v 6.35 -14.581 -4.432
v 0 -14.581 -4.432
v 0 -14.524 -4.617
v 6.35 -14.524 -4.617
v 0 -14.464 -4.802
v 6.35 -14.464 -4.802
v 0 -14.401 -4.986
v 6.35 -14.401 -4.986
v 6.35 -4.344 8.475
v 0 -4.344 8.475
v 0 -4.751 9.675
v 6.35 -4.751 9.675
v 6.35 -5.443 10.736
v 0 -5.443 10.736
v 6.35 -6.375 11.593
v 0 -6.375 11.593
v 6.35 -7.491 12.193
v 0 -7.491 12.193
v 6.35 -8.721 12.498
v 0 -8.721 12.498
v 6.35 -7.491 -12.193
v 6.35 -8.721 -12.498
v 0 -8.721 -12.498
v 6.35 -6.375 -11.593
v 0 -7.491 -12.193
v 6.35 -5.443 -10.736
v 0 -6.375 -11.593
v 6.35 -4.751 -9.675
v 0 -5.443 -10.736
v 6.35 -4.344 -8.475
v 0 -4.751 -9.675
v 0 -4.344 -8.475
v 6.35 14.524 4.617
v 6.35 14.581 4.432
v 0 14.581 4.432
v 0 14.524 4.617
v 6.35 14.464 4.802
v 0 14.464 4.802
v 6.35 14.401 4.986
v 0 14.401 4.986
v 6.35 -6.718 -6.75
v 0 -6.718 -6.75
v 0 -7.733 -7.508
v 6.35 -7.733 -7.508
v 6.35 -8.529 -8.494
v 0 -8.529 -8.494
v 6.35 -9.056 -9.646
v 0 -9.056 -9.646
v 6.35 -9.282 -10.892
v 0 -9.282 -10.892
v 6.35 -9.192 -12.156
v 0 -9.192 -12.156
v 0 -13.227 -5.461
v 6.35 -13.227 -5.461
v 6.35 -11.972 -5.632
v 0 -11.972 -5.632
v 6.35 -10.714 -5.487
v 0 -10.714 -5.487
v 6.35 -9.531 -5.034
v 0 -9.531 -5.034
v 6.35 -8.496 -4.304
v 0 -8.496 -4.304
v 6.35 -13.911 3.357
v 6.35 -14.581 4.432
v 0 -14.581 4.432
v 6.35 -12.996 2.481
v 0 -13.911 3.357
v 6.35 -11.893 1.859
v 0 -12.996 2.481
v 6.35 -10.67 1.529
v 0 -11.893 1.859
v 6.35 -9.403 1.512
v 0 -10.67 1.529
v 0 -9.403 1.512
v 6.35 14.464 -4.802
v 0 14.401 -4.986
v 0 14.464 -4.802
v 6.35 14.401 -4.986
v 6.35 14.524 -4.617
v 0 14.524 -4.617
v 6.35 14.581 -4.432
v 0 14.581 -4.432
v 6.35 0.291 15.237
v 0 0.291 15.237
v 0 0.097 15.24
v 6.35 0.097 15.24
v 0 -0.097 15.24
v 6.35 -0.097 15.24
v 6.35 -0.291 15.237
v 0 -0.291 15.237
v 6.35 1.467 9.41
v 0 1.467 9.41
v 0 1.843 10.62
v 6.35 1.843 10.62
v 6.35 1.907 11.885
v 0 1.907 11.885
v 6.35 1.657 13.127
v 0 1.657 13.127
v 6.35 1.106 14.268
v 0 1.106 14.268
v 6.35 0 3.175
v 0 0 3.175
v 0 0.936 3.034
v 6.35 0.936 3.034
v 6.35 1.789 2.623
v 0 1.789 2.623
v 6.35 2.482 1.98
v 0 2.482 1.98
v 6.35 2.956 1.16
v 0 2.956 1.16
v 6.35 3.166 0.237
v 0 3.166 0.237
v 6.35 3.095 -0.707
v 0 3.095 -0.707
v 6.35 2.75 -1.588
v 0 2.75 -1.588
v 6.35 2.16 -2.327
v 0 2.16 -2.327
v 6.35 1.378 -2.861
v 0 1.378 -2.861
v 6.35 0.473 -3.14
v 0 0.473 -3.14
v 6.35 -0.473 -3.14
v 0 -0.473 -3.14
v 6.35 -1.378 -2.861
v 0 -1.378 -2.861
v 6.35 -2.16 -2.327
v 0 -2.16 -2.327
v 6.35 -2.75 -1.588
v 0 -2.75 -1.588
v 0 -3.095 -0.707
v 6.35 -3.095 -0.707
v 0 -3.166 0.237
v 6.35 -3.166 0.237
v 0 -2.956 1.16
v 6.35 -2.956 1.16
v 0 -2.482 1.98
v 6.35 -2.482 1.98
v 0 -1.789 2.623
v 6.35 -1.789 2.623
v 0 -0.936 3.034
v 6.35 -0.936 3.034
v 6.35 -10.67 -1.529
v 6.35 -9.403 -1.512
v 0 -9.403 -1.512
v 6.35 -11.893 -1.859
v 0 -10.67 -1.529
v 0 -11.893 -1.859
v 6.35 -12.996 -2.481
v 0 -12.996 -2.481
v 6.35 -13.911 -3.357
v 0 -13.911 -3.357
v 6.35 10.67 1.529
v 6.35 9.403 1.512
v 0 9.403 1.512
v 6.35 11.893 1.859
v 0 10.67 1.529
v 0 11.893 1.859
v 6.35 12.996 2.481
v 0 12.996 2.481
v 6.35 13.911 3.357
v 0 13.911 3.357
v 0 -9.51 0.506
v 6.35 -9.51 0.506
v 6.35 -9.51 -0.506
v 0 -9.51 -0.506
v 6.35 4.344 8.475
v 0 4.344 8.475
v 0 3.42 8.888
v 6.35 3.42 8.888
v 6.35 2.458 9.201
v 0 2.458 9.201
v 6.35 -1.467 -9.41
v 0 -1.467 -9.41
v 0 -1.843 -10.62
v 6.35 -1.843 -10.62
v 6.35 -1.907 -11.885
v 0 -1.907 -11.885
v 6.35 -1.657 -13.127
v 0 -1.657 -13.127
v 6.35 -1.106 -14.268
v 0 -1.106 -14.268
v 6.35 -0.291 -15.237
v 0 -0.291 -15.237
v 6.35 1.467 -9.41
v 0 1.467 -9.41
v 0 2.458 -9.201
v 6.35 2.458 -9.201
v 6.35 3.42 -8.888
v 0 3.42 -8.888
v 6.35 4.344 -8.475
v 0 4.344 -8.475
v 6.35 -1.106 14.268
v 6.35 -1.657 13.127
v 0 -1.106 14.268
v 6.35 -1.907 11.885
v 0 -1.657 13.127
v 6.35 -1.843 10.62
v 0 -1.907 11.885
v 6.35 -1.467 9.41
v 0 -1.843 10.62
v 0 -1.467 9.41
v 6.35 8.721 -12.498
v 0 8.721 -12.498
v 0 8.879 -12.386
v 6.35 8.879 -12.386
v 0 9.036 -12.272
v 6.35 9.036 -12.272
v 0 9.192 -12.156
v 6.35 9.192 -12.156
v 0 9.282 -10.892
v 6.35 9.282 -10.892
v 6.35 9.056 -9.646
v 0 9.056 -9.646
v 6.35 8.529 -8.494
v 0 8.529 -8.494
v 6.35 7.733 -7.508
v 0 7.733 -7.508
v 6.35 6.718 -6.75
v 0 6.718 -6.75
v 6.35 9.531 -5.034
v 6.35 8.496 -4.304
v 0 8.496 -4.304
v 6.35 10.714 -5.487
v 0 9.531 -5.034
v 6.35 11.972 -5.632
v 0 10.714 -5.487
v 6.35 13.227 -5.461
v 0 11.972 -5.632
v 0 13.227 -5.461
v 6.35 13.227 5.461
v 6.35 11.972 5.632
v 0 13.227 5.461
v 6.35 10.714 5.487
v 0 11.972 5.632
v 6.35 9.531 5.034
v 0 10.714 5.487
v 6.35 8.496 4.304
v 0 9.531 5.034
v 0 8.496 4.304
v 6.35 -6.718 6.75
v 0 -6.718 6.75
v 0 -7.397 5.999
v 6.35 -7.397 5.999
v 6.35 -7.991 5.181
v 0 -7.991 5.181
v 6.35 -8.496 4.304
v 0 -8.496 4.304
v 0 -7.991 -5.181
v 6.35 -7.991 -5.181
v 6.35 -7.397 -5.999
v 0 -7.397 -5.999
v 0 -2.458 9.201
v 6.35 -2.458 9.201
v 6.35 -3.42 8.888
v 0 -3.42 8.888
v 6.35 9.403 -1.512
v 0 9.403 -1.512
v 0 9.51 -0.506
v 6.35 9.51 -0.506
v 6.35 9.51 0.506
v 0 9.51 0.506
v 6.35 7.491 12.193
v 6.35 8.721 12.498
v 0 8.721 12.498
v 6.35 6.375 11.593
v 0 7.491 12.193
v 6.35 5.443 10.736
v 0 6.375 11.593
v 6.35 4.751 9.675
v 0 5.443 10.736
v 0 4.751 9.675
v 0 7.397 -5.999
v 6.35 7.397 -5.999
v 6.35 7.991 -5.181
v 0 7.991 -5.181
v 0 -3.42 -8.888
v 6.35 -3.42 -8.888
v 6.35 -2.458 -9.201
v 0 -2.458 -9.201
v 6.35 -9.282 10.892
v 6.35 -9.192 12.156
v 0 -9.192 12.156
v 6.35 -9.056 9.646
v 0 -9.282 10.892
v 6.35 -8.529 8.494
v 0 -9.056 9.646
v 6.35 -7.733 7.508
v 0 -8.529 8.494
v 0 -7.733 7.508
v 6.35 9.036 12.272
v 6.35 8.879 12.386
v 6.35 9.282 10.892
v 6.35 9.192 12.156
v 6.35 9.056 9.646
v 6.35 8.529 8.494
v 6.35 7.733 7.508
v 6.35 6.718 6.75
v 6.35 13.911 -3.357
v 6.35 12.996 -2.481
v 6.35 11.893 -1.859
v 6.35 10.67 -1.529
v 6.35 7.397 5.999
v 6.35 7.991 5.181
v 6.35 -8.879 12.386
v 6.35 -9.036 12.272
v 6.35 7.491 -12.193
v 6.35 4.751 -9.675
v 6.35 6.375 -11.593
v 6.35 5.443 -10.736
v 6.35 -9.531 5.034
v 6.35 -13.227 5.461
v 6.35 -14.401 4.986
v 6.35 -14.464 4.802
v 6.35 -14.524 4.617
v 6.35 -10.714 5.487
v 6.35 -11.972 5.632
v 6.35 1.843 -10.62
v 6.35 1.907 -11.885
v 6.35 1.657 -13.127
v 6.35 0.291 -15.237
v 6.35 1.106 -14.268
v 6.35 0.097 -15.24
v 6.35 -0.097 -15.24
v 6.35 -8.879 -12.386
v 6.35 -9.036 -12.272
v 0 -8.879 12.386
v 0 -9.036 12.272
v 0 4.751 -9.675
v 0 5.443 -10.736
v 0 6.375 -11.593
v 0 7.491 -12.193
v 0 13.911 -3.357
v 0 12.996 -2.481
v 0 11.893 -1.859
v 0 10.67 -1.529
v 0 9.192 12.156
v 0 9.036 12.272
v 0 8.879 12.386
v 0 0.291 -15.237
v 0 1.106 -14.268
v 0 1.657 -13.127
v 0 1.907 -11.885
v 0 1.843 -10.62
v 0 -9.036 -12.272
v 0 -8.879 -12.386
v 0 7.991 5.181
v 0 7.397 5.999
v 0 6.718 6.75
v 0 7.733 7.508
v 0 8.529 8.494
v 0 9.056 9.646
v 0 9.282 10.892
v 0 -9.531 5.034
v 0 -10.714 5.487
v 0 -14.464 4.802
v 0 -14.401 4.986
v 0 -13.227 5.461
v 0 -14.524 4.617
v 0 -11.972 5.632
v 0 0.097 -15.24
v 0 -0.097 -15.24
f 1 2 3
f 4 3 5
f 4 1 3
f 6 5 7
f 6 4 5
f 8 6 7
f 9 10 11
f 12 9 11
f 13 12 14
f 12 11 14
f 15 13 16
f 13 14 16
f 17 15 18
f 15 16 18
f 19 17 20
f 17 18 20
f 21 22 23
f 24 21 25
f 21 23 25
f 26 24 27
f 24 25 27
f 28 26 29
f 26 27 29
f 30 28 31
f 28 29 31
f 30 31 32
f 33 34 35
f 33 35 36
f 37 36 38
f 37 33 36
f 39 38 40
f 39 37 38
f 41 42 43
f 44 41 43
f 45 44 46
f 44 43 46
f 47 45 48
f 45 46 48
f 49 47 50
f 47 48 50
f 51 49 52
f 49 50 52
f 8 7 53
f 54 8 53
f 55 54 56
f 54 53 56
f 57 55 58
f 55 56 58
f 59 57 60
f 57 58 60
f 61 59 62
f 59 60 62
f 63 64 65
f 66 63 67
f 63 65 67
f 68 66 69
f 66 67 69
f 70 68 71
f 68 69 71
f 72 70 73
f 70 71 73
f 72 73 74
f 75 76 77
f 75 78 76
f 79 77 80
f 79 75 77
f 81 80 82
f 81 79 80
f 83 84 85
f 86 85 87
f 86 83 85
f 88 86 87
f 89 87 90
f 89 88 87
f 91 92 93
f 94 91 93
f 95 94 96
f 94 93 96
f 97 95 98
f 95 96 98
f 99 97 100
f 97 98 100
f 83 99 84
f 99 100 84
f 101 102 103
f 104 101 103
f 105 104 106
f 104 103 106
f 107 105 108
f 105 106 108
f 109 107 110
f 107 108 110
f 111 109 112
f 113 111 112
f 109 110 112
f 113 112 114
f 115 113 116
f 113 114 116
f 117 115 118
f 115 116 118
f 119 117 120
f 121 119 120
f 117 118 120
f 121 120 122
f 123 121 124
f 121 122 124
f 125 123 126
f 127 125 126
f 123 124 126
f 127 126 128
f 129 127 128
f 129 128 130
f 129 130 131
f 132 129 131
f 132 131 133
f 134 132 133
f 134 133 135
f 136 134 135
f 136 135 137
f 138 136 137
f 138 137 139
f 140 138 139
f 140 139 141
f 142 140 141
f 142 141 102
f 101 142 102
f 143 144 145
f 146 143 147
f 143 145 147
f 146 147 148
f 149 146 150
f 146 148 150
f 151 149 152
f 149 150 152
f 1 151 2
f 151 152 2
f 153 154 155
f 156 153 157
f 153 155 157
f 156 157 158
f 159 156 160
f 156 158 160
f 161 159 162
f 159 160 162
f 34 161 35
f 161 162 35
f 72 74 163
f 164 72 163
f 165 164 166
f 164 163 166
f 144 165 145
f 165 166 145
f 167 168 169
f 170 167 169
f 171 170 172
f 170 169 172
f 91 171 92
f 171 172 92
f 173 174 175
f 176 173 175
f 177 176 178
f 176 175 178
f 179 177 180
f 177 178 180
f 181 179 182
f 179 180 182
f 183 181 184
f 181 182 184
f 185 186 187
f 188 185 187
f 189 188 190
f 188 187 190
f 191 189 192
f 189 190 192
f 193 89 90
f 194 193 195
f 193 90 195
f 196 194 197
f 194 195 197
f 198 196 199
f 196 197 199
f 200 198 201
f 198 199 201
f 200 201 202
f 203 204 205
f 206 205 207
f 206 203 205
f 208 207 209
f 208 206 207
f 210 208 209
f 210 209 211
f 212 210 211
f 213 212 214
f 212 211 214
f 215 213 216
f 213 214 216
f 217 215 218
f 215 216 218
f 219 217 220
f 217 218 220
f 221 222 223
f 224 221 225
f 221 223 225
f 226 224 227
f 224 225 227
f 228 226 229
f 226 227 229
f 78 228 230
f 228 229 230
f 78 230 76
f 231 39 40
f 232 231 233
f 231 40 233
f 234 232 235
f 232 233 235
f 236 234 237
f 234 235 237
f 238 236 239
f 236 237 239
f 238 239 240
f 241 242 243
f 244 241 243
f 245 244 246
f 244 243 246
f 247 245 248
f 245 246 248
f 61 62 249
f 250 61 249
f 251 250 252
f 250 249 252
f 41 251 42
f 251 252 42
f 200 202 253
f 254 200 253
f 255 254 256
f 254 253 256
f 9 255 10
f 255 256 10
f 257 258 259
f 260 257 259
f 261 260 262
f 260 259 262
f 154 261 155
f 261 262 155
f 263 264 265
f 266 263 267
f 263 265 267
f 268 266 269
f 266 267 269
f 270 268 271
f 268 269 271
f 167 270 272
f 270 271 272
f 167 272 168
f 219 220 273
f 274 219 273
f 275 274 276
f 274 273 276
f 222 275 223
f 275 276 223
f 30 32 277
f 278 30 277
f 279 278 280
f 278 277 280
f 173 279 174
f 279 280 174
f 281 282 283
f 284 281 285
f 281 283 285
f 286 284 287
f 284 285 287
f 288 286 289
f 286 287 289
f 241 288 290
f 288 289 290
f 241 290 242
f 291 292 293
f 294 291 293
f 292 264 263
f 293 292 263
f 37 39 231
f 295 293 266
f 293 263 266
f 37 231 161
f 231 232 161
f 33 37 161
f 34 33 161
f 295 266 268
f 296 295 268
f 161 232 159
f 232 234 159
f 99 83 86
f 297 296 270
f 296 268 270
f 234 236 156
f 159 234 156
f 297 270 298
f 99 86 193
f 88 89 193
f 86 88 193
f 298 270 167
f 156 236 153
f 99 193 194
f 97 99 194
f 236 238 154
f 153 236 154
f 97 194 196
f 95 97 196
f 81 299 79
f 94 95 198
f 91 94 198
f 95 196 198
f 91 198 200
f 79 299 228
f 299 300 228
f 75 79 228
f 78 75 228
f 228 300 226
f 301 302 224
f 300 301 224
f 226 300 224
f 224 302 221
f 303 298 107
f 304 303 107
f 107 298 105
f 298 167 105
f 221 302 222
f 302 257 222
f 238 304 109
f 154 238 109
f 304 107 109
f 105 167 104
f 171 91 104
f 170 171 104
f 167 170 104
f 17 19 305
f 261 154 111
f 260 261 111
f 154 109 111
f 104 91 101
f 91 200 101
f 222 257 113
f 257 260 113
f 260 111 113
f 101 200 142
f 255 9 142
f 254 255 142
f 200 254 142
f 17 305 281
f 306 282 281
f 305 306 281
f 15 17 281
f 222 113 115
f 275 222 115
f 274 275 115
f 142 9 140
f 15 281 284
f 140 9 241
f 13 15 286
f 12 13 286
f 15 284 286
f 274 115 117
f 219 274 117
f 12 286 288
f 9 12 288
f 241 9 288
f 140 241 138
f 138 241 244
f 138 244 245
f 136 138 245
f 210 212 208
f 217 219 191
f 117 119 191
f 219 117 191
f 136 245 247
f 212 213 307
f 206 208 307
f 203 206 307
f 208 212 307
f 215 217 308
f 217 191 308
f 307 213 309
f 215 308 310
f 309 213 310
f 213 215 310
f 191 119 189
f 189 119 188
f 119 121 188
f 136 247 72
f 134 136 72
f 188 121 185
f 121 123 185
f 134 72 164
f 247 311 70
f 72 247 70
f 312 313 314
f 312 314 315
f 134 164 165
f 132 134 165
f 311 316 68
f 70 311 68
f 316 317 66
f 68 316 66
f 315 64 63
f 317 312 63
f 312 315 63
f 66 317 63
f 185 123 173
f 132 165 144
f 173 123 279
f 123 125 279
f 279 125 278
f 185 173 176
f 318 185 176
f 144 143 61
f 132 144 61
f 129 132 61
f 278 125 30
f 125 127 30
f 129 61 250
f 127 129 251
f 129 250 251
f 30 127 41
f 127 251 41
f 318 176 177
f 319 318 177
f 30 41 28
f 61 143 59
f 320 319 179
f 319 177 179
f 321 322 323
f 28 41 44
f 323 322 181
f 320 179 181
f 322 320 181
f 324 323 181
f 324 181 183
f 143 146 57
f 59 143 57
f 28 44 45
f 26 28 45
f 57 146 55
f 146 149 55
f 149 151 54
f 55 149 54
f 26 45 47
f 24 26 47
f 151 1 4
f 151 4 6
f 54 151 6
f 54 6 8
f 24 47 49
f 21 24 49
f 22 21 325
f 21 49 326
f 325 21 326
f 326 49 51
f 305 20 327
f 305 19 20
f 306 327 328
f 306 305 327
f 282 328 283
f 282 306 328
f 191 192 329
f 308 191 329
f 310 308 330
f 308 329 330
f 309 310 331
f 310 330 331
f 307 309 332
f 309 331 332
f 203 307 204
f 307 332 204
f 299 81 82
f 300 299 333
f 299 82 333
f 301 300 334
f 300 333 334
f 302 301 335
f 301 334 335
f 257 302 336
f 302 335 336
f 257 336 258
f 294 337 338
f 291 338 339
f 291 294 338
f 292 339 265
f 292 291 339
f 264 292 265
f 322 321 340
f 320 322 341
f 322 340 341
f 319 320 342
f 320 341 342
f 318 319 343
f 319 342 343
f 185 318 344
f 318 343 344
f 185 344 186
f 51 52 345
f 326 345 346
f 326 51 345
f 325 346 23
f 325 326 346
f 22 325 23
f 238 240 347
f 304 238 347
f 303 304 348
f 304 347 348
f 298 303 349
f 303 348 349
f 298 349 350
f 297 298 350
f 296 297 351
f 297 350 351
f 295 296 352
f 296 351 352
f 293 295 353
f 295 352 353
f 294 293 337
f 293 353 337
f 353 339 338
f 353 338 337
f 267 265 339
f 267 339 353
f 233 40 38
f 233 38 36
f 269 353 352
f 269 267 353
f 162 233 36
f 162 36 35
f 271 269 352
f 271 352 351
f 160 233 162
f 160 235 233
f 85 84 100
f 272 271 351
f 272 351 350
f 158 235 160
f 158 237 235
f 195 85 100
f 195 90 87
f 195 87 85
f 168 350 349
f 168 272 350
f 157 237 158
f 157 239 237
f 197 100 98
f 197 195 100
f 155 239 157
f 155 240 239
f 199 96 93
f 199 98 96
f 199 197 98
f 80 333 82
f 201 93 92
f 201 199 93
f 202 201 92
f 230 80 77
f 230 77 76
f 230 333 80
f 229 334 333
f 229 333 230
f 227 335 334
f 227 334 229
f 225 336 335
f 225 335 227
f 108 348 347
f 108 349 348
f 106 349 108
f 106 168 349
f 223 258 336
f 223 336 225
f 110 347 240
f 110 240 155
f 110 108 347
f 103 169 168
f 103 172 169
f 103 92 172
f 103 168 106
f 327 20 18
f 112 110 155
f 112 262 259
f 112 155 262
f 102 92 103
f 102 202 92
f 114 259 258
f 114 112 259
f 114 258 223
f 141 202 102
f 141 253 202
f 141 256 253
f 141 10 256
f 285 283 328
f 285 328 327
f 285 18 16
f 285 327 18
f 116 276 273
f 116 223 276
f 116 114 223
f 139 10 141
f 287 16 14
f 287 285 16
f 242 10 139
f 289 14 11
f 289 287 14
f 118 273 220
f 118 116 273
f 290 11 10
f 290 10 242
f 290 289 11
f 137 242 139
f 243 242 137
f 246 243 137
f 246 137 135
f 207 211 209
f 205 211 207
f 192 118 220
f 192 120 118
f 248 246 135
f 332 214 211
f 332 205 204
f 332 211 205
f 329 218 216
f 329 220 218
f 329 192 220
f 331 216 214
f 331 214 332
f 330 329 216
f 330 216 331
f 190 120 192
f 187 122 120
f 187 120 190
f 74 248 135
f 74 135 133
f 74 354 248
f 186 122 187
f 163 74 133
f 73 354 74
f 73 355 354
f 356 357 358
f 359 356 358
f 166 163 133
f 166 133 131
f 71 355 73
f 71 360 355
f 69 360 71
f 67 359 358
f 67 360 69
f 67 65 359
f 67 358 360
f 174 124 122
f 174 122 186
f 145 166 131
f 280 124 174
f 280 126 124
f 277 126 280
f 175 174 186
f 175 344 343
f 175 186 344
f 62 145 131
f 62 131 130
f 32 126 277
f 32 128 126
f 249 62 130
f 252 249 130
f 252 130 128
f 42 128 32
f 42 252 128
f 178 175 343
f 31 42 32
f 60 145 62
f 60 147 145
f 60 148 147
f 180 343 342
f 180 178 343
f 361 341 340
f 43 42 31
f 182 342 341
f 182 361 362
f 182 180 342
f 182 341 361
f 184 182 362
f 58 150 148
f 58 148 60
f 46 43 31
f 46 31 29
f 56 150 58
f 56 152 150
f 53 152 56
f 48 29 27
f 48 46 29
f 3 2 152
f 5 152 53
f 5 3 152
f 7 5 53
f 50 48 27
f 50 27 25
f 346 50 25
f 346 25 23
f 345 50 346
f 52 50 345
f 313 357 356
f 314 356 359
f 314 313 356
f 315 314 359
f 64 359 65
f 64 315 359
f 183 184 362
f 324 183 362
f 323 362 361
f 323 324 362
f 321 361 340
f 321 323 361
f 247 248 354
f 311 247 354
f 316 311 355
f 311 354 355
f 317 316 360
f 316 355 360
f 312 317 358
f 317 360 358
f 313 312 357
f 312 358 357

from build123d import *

# Parameters (mm, degrees)
BASPROSKE_W        = 6.35
BASPROSKE_H        = 15.24
TOOTHCUT_DEPTH     = 23.468593636
TEETHCUTS_COUNT    = 10
TEETHCUTS_ANGLE    = 324
BORSKE_R           = 0.396875
BORE_DEPTH         = 50.8000508
KEYSKE_W           = 0.254
KEYSKE_H           = 0.619125
KEYWAY_DEPTH       = 50.8000508
SKETCH1_R          = 3.175
CUT_EXTRUDE1_DEPTH = 23.027224313


with BuildPart() as part:
    # BasProSke → Base-Revolve (revolve)
    with BuildSketch(Plane(origin=(0, 0, 0), x_dir=(1, 0, 0), z_dir=(0, 1, 0)), mode=Mode.PRIVATE) as base_revolve_sk:
        with Locations((3.175, 7.62)):
            Rectangle(BASPROSKE_W, BASPROSKE_H)
    revolve(base_revolve_sk.sketch.rotate(Axis((-10, 0, 0), (1, 0, 0)), 180), axis=Axis((-10, 0, 0), (1, 0, 0)))

    # TooCutSke → ToothCut (cut, through all)
    with BuildSketch(Plane(origin=(0, 0, 0), x_dir=(0, 0, -1), z_dir=(1, 0, 0))):
        with BuildLine():
            ThreePointArc((1.512171166, 9.402912925), (0, 9.52373), (-1.512171166, 9.402912925))
            ThreePointArc((-1.512171166, 9.402912925), (-2.144739364, 12.480481638), (-4.466452315, 14.597371026))
            ThreePointArc((-4.466452315, 14.597371026), (0, 15.2654), (4.466452315, 14.597371026))
            ThreePointArc((4.466452315, 14.597371026), (2.144739364, 12.480481638), (1.512171166, 9.402912925))
        make_face()
    toothcut = extrude(amount=TOOTHCUT_DEPTH, mode=Mode.SUBTRACT)

    # TeethCuts: ToothCut ×10 about axis
    teethcuts_axis = Axis((-10, 0, 0), (1, 0, 0))
    for i in range(1, TEETHCUTS_COUNT):
        add(toothcut.rotate(teethcuts_axis, i * TEETHCUTS_ANGLE / (TEETHCUTS_COUNT - 1)), mode=Mode.SUBTRACT)

    # BorSke → Bore (cut, symmetric)
    with BuildSketch(Plane(origin=(0, 0, 0), x_dir=(0, 0, -1), z_dir=(1, 0, 0))):
        with Locations(Location((0, 0, 0), (0, 0, 180))):
            Circle(BORSKE_R)
    extrude(amount=BORE_DEPTH, both=True, mode=Mode.SUBTRACT)

    # KeySke → Keyway (cut, symmetric)
    with BuildSketch(Plane(origin=(0, 0, 0), x_dir=(0, 0, -1), z_dir=(1, 0, 0))):
        with Locations((0, 0.3095625)):
            Rectangle(KEYSKE_W, KEYSKE_H)
    extrude(amount=KEYWAY_DEPTH, both=True, mode=Mode.SUBTRACT)

    # Sketch1 → Cut-Extrude1 (cut, through all)
    with BuildSketch(Plane.ZY):
        Circle(SKETCH1_R)
    extrude(amount=-CUT_EXTRUDE1_DEPTH, mode=Mode.SUBTRACT)


solid = part.part
